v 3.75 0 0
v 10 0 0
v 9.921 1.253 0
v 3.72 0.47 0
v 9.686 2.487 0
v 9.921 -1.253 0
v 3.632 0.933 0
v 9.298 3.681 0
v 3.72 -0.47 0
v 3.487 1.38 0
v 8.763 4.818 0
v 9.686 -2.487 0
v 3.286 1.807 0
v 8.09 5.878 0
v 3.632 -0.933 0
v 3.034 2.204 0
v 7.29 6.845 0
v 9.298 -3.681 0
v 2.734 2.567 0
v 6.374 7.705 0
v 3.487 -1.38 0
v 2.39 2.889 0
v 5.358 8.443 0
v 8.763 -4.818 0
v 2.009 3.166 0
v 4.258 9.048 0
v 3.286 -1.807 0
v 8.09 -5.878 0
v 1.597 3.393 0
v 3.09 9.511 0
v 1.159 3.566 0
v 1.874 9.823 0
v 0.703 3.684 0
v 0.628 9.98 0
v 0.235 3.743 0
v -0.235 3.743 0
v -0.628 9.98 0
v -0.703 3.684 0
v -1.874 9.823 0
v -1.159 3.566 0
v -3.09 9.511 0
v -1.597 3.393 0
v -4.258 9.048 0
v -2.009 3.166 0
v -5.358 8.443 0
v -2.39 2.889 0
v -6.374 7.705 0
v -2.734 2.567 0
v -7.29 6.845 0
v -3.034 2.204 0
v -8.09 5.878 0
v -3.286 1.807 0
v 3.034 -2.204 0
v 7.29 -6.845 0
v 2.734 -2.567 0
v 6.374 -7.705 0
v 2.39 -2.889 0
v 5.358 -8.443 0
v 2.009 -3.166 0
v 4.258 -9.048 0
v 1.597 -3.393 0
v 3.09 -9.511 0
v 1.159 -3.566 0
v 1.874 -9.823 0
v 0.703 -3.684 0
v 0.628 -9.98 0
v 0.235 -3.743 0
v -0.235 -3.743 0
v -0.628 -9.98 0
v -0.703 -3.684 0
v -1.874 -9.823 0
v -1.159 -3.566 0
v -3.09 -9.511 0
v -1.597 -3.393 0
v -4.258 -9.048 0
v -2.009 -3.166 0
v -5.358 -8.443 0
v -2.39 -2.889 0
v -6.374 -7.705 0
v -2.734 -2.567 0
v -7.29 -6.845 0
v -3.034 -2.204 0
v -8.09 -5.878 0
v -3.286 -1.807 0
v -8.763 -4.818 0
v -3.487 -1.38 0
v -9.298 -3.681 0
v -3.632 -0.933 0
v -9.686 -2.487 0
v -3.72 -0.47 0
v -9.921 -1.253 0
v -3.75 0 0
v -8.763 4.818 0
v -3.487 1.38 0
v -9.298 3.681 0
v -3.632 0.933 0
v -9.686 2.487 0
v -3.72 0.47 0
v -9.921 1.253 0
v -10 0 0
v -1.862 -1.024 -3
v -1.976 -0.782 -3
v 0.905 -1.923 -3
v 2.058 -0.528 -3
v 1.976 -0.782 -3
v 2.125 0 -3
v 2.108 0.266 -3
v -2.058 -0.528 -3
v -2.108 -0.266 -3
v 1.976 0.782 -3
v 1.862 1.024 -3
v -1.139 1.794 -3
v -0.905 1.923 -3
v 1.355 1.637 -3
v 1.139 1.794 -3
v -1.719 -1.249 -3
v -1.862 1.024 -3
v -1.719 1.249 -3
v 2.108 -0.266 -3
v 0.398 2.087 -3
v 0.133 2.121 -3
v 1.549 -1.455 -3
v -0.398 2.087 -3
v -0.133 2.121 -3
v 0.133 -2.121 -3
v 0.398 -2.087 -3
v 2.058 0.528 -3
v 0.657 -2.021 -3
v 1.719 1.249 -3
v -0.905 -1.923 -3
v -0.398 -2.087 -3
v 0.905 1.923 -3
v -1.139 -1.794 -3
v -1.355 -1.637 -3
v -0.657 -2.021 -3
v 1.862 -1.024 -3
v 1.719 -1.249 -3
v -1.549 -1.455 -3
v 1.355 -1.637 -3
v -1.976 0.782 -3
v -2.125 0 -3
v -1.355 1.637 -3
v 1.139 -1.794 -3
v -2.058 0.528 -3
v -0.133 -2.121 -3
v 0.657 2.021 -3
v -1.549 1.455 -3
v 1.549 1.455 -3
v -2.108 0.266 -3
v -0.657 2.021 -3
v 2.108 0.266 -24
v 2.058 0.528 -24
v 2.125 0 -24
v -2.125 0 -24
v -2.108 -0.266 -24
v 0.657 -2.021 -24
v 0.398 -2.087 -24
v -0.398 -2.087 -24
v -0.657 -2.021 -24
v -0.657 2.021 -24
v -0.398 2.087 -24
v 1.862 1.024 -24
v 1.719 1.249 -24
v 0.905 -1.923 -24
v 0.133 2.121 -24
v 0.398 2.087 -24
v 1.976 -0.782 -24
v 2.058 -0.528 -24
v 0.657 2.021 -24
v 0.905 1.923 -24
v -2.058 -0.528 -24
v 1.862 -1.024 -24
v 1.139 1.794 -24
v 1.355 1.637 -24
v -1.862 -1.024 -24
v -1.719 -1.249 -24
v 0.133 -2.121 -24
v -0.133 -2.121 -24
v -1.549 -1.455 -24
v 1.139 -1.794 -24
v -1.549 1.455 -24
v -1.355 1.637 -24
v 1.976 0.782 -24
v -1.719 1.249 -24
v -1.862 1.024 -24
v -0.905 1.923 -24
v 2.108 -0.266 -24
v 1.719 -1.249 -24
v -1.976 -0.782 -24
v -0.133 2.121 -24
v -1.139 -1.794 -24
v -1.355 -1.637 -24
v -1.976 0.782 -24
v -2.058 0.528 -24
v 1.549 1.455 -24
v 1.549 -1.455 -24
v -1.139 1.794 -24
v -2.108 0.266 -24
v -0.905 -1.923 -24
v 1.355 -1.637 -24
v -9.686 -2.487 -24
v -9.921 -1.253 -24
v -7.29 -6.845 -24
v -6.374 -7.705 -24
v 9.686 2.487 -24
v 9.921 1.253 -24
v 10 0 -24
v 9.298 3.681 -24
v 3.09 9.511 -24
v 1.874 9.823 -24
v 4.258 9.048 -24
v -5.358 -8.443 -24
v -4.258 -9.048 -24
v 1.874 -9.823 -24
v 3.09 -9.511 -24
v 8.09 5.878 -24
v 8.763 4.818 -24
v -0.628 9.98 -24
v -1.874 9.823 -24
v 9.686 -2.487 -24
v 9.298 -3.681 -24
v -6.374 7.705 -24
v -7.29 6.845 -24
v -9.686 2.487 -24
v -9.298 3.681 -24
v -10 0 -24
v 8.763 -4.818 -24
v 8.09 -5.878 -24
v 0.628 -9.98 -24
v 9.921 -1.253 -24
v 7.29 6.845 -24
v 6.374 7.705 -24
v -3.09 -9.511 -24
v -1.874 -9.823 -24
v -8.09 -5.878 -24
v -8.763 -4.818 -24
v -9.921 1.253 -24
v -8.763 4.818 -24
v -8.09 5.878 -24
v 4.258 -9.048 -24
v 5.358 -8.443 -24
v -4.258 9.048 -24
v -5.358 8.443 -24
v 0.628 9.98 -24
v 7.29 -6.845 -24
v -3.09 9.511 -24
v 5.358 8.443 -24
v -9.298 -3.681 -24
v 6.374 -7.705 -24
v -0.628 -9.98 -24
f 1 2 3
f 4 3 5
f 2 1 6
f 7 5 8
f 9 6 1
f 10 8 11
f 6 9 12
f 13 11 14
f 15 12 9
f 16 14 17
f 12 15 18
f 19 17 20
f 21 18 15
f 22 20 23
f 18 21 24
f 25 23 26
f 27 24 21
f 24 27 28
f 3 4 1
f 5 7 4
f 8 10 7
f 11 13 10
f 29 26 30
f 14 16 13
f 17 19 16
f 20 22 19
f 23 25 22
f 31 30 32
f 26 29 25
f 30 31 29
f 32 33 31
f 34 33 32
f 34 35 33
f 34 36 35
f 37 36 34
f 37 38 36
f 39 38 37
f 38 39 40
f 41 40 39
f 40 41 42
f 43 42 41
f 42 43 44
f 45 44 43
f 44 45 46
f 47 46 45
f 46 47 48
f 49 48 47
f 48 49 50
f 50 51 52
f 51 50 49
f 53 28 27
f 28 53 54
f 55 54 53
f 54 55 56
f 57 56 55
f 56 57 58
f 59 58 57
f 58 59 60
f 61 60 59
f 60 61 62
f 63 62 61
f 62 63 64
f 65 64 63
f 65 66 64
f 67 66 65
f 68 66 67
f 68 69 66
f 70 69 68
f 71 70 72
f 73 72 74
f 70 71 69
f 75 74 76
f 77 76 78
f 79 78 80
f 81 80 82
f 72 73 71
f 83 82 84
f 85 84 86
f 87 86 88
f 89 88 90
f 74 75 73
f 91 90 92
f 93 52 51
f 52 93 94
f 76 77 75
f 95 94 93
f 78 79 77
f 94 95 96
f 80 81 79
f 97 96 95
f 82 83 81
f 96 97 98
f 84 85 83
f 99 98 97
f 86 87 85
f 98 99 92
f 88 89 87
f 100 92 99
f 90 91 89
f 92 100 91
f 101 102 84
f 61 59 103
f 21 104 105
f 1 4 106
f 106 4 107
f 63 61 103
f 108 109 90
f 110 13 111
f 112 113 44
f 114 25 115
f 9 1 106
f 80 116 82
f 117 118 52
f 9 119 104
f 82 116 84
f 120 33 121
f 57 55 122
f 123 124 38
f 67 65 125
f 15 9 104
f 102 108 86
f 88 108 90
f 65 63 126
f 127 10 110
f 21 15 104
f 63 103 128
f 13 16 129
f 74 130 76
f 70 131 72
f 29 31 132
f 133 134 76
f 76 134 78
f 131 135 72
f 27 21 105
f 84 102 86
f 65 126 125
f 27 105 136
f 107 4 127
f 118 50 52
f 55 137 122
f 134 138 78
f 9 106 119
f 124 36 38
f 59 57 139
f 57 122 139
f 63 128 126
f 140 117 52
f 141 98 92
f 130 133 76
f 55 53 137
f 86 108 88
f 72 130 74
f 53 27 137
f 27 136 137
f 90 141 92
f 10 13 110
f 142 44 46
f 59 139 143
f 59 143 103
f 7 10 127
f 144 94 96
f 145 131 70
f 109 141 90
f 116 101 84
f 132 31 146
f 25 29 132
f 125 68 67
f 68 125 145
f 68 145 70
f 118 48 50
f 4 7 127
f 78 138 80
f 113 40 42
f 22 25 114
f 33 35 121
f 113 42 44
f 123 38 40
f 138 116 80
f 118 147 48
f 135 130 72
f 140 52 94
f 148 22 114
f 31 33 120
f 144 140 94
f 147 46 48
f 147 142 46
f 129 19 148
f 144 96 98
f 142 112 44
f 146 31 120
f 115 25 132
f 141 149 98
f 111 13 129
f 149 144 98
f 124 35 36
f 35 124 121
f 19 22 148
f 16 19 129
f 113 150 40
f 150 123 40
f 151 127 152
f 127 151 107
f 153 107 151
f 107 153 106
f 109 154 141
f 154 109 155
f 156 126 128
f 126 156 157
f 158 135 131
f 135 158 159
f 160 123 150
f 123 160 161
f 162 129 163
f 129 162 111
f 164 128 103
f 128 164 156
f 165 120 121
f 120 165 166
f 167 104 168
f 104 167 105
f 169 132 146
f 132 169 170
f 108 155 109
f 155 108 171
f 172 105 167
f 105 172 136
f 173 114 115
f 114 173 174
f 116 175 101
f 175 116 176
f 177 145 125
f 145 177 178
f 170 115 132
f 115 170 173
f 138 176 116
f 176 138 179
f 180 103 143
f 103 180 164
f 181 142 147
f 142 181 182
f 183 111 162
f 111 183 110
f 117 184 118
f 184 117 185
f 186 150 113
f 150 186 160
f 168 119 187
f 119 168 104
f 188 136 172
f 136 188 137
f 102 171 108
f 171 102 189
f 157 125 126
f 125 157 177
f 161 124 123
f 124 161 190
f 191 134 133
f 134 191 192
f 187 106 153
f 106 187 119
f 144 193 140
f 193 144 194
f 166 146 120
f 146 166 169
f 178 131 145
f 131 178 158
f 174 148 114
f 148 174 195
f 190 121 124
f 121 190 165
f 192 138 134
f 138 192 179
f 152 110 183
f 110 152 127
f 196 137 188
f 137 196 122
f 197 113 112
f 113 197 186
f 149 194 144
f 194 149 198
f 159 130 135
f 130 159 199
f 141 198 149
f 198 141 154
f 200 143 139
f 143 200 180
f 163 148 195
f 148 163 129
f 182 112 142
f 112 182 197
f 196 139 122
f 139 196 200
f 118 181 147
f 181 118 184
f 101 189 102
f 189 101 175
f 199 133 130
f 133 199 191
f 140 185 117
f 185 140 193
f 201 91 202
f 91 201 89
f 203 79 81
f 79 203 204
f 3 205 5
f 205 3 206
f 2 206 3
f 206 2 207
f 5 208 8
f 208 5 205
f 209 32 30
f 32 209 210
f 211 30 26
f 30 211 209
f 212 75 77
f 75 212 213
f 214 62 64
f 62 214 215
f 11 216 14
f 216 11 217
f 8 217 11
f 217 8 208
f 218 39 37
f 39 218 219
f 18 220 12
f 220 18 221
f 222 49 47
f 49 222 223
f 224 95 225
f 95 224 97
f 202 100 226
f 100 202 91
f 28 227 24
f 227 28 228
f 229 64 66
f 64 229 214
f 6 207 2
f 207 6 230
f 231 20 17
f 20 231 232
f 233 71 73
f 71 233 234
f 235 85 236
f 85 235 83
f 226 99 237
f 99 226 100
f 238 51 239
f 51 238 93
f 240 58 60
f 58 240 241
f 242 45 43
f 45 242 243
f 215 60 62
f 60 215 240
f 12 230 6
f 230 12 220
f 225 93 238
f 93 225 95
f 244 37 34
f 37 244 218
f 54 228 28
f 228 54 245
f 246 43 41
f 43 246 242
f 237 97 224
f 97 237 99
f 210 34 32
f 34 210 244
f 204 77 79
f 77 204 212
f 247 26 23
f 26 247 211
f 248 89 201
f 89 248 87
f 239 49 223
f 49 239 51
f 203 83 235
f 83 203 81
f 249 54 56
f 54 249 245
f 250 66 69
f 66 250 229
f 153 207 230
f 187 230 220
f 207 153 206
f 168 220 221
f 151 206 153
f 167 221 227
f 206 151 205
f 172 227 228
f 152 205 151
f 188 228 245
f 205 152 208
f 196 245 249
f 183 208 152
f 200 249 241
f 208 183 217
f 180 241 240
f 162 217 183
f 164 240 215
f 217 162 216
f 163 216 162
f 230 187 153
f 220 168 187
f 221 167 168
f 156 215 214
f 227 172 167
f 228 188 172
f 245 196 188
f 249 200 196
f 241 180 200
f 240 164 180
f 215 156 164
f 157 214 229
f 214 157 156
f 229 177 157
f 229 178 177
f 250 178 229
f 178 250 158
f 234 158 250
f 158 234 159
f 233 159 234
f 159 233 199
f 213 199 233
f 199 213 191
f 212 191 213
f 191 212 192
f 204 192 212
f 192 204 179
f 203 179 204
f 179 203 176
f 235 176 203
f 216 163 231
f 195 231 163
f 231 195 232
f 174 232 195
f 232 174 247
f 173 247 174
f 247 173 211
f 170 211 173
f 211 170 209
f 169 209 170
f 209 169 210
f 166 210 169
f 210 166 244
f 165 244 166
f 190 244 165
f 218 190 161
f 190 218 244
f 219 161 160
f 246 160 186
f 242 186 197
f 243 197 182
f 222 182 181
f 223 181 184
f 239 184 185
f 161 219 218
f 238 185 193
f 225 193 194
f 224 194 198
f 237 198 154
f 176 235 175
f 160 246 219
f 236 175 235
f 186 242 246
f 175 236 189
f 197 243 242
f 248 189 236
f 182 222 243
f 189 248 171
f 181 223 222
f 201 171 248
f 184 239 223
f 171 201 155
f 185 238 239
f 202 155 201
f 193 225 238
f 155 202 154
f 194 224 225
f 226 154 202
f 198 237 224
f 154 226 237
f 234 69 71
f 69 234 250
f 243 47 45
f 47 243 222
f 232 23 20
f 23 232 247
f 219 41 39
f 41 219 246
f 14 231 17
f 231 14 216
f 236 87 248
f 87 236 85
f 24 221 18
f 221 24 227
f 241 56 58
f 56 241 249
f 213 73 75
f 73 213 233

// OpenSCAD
$fn = 50;

difference() {
	union() {
		translate(v = [0, 0, -24.0]) {
			cylinder(h = 24, r = 10.0);
		}
	}
	union() {
		translate(v = [0, 0, 0]) {
			rotate(a = [0, 0, 0]) {
				difference() {
					union() {
						translate(v = [0, 0, -27.0]) {
							cylinder(h = 27, r = 2.0);
						}
						translate(v = [0, 0, -3]) {
							cylinder(h = 3, r1 = 2.125, r2 = 3.75);
						}
						translate(v = [0, 0, -27.0]) {
							cylinder(h = 27, r = 2.125);
						}
						translate(v = [0, 0, -27.0]) {
							cylinder(h = 27, r = 2.0);
						}
					}
					union();
				}
			}
		}
	}
}
